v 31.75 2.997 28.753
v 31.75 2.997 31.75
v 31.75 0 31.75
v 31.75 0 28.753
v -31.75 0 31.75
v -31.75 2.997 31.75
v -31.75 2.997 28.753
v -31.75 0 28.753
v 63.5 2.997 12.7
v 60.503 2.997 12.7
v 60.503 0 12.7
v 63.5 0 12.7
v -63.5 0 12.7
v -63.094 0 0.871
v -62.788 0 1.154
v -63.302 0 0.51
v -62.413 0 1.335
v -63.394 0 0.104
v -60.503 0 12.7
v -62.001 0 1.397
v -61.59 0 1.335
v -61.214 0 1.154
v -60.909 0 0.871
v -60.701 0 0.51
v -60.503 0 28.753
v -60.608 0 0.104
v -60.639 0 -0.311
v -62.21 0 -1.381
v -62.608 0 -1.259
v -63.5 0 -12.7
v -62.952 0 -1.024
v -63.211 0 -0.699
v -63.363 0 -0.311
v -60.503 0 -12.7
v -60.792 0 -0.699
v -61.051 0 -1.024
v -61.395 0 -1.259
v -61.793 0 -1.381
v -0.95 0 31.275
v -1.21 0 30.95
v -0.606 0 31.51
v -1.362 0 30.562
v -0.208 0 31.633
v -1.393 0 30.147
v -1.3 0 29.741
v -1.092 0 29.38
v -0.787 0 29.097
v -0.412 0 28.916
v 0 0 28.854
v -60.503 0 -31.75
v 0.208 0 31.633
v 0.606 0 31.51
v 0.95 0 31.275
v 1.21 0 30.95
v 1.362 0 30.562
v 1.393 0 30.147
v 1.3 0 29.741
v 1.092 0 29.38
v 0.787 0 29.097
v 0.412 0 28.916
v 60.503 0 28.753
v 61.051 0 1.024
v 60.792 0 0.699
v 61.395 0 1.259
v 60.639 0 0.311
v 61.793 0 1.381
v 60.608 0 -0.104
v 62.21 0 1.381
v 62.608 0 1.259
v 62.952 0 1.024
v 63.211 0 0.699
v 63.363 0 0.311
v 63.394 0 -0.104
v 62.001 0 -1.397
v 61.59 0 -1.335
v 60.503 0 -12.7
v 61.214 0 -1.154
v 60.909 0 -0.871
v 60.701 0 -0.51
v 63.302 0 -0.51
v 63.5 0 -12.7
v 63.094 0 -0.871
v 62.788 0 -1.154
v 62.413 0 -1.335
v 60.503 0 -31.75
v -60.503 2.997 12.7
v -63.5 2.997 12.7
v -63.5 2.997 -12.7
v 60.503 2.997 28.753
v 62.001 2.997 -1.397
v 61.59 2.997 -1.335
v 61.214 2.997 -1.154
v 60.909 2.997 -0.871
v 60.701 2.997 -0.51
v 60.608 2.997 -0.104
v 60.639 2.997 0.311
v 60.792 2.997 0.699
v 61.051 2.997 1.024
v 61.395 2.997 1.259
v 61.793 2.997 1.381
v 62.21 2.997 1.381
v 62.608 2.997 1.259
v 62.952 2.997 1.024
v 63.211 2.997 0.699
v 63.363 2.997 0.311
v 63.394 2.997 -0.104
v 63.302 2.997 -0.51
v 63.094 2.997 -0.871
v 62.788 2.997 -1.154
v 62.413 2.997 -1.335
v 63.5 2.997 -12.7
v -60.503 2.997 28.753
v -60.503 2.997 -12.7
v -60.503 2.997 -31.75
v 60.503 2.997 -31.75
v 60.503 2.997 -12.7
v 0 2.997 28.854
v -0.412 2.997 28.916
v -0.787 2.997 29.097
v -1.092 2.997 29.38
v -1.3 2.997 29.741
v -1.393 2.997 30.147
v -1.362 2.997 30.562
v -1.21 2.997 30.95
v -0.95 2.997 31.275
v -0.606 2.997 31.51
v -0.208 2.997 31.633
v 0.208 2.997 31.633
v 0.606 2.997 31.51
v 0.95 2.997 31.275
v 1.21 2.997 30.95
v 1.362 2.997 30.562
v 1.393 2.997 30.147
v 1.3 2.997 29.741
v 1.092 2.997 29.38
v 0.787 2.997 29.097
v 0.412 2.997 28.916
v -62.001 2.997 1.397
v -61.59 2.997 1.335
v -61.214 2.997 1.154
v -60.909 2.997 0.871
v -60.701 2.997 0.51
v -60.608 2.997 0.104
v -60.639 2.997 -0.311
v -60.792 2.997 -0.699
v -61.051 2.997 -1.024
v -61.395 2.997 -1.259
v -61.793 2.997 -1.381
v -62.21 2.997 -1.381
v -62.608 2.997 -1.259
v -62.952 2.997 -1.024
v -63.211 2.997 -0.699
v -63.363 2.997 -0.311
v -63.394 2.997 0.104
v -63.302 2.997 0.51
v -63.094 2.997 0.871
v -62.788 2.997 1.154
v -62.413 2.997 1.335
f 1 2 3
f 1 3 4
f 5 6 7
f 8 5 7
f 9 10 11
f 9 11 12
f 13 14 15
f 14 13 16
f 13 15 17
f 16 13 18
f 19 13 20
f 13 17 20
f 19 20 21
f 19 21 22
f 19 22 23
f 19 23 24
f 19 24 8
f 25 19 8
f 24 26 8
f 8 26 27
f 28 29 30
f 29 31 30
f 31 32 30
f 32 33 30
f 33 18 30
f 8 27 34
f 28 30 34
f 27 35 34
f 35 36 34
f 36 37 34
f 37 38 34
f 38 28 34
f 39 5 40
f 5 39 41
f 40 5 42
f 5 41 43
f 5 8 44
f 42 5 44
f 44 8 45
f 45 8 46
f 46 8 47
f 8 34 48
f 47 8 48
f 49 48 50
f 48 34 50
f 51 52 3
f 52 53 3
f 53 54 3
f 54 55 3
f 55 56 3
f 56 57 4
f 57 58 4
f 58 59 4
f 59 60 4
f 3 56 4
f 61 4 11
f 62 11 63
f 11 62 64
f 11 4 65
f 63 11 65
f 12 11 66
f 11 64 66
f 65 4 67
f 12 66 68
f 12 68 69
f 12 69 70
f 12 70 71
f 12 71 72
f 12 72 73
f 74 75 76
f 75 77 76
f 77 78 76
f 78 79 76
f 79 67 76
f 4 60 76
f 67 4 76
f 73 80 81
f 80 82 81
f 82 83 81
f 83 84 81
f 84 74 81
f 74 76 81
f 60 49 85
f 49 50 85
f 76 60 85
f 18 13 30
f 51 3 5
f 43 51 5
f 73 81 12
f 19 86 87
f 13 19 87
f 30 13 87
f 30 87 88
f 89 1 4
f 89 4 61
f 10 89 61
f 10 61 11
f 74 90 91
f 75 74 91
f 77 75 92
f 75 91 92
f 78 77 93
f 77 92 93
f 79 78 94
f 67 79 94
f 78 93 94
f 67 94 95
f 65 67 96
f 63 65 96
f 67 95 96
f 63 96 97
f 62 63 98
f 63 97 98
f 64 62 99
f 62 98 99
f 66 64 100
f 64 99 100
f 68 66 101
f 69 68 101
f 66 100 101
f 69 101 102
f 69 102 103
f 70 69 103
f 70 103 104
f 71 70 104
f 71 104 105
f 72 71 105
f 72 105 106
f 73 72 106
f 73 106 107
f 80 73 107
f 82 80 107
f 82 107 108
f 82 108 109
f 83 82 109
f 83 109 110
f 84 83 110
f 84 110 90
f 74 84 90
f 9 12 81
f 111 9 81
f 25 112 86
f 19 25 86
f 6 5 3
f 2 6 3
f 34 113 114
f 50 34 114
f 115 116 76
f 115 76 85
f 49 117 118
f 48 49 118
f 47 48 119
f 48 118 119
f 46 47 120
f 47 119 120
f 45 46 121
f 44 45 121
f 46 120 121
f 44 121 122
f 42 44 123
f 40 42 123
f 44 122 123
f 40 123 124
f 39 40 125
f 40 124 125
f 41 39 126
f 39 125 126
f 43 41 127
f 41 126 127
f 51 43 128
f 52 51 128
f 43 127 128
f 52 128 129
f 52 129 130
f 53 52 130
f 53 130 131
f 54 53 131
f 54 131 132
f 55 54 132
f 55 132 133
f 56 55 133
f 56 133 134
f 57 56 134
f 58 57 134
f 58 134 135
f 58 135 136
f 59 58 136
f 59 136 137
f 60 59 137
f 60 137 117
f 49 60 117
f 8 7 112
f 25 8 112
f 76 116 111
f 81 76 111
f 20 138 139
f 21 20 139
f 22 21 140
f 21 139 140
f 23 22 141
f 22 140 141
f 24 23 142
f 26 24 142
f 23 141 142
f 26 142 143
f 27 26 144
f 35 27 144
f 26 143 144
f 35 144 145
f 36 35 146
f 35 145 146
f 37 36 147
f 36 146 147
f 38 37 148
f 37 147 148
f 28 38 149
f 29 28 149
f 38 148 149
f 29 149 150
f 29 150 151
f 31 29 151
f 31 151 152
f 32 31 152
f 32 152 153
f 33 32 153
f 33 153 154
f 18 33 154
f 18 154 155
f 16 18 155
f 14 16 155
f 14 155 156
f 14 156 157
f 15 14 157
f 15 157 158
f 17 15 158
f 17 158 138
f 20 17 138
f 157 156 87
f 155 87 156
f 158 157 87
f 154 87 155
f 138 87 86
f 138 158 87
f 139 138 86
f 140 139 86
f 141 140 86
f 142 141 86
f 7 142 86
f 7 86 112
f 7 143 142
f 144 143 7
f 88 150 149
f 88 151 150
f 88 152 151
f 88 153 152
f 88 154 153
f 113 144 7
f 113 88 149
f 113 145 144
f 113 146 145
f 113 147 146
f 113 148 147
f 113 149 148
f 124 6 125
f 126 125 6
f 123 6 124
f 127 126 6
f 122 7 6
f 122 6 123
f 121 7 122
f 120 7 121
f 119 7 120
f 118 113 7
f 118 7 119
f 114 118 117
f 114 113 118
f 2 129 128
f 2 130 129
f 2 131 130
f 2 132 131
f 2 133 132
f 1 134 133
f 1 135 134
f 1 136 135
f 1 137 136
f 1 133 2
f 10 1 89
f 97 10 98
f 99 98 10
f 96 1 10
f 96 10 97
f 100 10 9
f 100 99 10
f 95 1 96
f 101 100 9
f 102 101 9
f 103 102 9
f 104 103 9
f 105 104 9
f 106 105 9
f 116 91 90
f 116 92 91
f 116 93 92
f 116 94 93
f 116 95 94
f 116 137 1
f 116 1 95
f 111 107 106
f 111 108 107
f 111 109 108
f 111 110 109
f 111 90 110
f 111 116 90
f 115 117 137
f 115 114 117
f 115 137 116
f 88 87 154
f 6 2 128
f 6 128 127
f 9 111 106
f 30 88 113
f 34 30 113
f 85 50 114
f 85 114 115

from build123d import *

# Parameters (mm, degrees)
SKETCH1_W           = 127
SKETCH1_H           = 63.5
BOSS_EXTRUDE1_DEPTH = 2.9972
CUT_EXTRUDE1_REACH  = 73.058
SKETCH2_R           = 1.397
SKETCH2_W           = 2.9972
SKETCH2_H           = 19.05


with BuildPart() as part:
    # Sketch1 → Boss-Extrude1 (new body)
    with BuildSketch(Plane(origin=(0, 0, 0), x_dir=(1, 0, 0), z_dir=(0, 1, 0))):
        Rectangle(SKETCH1_W, SKETCH1_H)
    extrude(amount=BOSS_EXTRUDE1_DEPTH)

    # Sketch2 → Cut-Extrude1 (cut, up to next)
    with BuildSketch(Plane(origin=(0, 2.9972, 0), x_dir=(1, 0, 0), z_dir=(0, 1, 0)), mode=Mode.PRIVATE) as cut_extrude1_sk1:
        with Locations(Location((0, -30.2514, 0), (0, 0, 90))):
            Circle(SKETCH2_R)
    cut_extrude1_tool1 = extrude(cut_extrude1_sk1.sketch, amount=-CUT_EXTRUDE1_REACH, mode=Mode.PRIVATE) & part.part
    # Sketch2 → Cut-Extrude1 (cut, up to next)
    with BuildSketch(Plane(origin=(0, 2.9972, 0), x_dir=(1, 0, 0), z_dir=(0, 1, 0)), mode=Mode.PRIVATE) as cut_extrude1_sk2:
        with Locations(Location((-62.0014, 0, 0), (0, 0, 270))):
            Circle(SKETCH2_R)
    cut_extrude1_tool2 = extrude(cut_extrude1_sk2.sketch, amount=-CUT_EXTRUDE1_REACH, mode=Mode.PRIVATE) & part.part
    # Sketch2 → Cut-Extrude1 (cut, up to next)
    with BuildSketch(Plane(origin=(0, 2.9972, 0), x_dir=(1, 0, 0), z_dir=(0, 1, 0)), mode=Mode.PRIVATE) as cut_extrude1_sk3:
        with Locations(Location((62.0014, 0, 0), (0, 0, 90))):
            Circle(SKETCH2_R)
    cut_extrude1_tool3 = extrude(cut_extrude1_sk3.sketch, amount=-CUT_EXTRUDE1_REACH, mode=Mode.PRIVATE) & part.part
    # Sketch2 → Cut-Extrude1 (cut, up to next)
    with BuildSketch(Plane(origin=(0, 2.9972, 0), x_dir=(1, 0, 0), z_dir=(0, 1, 0)), mode=Mode.PRIVATE) as cut_extrude1_sk4:
        Polygon((63.5, -31.75), (31.75, -31.75), (31.75, -28.7528), (60.5028, -28.7528), (60.5028, -12.7), (63.5, -12.7), (63.5, -28.7528), align=None)
    cut_extrude1_tool4 = extrude(cut_extrude1_sk4.sketch, amount=-CUT_EXTRUDE1_REACH, mode=Mode.PRIVATE) & part.part
    # Sketch2 → Cut-Extrude1 (cut, up to next)
    with BuildSketch(Plane(origin=(0, 2.9972, 0), x_dir=(1, 0, 0), z_dir=(0, 1, 0)), mode=Mode.PRIVATE) as cut_extrude1_sk5:
        with Locations((-62.0014, 22.225)):
            Rectangle(SKETCH2_W, SKETCH2_H)
    cut_extrude1_tool5 = extrude(cut_extrude1_sk5.sketch, amount=-CUT_EXTRUDE1_REACH, mode=Mode.PRIVATE) & part.part
    # Sketch2 → Cut-Extrude1 (cut, up to next)
    with BuildSketch(Plane(origin=(0, 2.9972, 0), x_dir=(1, 0, 0), z_dir=(0, 1, 0)), mode=Mode.PRIVATE) as cut_extrude1_sk6:
        Polygon((-63.5, -31.75), (-31.75, -31.75), (-31.75, -28.7528), (-60.5028, -28.7528), (-60.5028, -12.7), (-63.5, -12.7), (-63.5, -28.7528), align=None)
    cut_extrude1_tool6 = extrude(cut_extrude1_sk6.sketch, amount=-CUT_EXTRUDE1_REACH, mode=Mode.PRIVATE) & part.part
    # Sketch2 → Cut-Extrude1 (cut, up to next)
    with BuildSketch(Plane(origin=(0, 2.9972, 0), x_dir=(1, 0, 0), z_dir=(0, 1, 0)), mode=Mode.PRIVATE) as cut_extrude1_sk7:
        with Locations((62.0014, 22.225)):
            Rectangle(SKETCH2_W, SKETCH2_H)
    cut_extrude1_tool7 = extrude(cut_extrude1_sk7.sketch, amount=-CUT_EXTRUDE1_REACH, mode=Mode.PRIVATE) & part.part
    add(cut_extrude1_tool1.solids().sort_by_distance((0, 2.9972, 30.2514))[0], mode=Mode.SUBTRACT)
    add(cut_extrude1_tool2.solids().sort_by_distance((-62.0014, 2.9972, 0))[0], mode=Mode.SUBTRACT)
    add(cut_extrude1_tool3.solids().sort_by_distance((62.0014, 2.9972, 0))[0], mode=Mode.SUBTRACT)
    add(cut_extrude1_tool4.solids().sort_by_distance((47.625, 2.9972, 31.379735))[0], mode=Mode.SUBTRACT)
    add(cut_extrude1_tool5.solids().sort_by_distance((-62.0014, 2.9972, -22.225))[0], mode=Mode.SUBTRACT)
    add(cut_extrude1_tool6.solids().sort_by_distance((-47.625, 2.9972, 31.379735))[0], mode=Mode.SUBTRACT)
    add(cut_extrude1_tool7.solids().sort_by_distance((62.0014, 2.9972, -22.225))[0], mode=Mode.SUBTRACT)


solid = part.part
